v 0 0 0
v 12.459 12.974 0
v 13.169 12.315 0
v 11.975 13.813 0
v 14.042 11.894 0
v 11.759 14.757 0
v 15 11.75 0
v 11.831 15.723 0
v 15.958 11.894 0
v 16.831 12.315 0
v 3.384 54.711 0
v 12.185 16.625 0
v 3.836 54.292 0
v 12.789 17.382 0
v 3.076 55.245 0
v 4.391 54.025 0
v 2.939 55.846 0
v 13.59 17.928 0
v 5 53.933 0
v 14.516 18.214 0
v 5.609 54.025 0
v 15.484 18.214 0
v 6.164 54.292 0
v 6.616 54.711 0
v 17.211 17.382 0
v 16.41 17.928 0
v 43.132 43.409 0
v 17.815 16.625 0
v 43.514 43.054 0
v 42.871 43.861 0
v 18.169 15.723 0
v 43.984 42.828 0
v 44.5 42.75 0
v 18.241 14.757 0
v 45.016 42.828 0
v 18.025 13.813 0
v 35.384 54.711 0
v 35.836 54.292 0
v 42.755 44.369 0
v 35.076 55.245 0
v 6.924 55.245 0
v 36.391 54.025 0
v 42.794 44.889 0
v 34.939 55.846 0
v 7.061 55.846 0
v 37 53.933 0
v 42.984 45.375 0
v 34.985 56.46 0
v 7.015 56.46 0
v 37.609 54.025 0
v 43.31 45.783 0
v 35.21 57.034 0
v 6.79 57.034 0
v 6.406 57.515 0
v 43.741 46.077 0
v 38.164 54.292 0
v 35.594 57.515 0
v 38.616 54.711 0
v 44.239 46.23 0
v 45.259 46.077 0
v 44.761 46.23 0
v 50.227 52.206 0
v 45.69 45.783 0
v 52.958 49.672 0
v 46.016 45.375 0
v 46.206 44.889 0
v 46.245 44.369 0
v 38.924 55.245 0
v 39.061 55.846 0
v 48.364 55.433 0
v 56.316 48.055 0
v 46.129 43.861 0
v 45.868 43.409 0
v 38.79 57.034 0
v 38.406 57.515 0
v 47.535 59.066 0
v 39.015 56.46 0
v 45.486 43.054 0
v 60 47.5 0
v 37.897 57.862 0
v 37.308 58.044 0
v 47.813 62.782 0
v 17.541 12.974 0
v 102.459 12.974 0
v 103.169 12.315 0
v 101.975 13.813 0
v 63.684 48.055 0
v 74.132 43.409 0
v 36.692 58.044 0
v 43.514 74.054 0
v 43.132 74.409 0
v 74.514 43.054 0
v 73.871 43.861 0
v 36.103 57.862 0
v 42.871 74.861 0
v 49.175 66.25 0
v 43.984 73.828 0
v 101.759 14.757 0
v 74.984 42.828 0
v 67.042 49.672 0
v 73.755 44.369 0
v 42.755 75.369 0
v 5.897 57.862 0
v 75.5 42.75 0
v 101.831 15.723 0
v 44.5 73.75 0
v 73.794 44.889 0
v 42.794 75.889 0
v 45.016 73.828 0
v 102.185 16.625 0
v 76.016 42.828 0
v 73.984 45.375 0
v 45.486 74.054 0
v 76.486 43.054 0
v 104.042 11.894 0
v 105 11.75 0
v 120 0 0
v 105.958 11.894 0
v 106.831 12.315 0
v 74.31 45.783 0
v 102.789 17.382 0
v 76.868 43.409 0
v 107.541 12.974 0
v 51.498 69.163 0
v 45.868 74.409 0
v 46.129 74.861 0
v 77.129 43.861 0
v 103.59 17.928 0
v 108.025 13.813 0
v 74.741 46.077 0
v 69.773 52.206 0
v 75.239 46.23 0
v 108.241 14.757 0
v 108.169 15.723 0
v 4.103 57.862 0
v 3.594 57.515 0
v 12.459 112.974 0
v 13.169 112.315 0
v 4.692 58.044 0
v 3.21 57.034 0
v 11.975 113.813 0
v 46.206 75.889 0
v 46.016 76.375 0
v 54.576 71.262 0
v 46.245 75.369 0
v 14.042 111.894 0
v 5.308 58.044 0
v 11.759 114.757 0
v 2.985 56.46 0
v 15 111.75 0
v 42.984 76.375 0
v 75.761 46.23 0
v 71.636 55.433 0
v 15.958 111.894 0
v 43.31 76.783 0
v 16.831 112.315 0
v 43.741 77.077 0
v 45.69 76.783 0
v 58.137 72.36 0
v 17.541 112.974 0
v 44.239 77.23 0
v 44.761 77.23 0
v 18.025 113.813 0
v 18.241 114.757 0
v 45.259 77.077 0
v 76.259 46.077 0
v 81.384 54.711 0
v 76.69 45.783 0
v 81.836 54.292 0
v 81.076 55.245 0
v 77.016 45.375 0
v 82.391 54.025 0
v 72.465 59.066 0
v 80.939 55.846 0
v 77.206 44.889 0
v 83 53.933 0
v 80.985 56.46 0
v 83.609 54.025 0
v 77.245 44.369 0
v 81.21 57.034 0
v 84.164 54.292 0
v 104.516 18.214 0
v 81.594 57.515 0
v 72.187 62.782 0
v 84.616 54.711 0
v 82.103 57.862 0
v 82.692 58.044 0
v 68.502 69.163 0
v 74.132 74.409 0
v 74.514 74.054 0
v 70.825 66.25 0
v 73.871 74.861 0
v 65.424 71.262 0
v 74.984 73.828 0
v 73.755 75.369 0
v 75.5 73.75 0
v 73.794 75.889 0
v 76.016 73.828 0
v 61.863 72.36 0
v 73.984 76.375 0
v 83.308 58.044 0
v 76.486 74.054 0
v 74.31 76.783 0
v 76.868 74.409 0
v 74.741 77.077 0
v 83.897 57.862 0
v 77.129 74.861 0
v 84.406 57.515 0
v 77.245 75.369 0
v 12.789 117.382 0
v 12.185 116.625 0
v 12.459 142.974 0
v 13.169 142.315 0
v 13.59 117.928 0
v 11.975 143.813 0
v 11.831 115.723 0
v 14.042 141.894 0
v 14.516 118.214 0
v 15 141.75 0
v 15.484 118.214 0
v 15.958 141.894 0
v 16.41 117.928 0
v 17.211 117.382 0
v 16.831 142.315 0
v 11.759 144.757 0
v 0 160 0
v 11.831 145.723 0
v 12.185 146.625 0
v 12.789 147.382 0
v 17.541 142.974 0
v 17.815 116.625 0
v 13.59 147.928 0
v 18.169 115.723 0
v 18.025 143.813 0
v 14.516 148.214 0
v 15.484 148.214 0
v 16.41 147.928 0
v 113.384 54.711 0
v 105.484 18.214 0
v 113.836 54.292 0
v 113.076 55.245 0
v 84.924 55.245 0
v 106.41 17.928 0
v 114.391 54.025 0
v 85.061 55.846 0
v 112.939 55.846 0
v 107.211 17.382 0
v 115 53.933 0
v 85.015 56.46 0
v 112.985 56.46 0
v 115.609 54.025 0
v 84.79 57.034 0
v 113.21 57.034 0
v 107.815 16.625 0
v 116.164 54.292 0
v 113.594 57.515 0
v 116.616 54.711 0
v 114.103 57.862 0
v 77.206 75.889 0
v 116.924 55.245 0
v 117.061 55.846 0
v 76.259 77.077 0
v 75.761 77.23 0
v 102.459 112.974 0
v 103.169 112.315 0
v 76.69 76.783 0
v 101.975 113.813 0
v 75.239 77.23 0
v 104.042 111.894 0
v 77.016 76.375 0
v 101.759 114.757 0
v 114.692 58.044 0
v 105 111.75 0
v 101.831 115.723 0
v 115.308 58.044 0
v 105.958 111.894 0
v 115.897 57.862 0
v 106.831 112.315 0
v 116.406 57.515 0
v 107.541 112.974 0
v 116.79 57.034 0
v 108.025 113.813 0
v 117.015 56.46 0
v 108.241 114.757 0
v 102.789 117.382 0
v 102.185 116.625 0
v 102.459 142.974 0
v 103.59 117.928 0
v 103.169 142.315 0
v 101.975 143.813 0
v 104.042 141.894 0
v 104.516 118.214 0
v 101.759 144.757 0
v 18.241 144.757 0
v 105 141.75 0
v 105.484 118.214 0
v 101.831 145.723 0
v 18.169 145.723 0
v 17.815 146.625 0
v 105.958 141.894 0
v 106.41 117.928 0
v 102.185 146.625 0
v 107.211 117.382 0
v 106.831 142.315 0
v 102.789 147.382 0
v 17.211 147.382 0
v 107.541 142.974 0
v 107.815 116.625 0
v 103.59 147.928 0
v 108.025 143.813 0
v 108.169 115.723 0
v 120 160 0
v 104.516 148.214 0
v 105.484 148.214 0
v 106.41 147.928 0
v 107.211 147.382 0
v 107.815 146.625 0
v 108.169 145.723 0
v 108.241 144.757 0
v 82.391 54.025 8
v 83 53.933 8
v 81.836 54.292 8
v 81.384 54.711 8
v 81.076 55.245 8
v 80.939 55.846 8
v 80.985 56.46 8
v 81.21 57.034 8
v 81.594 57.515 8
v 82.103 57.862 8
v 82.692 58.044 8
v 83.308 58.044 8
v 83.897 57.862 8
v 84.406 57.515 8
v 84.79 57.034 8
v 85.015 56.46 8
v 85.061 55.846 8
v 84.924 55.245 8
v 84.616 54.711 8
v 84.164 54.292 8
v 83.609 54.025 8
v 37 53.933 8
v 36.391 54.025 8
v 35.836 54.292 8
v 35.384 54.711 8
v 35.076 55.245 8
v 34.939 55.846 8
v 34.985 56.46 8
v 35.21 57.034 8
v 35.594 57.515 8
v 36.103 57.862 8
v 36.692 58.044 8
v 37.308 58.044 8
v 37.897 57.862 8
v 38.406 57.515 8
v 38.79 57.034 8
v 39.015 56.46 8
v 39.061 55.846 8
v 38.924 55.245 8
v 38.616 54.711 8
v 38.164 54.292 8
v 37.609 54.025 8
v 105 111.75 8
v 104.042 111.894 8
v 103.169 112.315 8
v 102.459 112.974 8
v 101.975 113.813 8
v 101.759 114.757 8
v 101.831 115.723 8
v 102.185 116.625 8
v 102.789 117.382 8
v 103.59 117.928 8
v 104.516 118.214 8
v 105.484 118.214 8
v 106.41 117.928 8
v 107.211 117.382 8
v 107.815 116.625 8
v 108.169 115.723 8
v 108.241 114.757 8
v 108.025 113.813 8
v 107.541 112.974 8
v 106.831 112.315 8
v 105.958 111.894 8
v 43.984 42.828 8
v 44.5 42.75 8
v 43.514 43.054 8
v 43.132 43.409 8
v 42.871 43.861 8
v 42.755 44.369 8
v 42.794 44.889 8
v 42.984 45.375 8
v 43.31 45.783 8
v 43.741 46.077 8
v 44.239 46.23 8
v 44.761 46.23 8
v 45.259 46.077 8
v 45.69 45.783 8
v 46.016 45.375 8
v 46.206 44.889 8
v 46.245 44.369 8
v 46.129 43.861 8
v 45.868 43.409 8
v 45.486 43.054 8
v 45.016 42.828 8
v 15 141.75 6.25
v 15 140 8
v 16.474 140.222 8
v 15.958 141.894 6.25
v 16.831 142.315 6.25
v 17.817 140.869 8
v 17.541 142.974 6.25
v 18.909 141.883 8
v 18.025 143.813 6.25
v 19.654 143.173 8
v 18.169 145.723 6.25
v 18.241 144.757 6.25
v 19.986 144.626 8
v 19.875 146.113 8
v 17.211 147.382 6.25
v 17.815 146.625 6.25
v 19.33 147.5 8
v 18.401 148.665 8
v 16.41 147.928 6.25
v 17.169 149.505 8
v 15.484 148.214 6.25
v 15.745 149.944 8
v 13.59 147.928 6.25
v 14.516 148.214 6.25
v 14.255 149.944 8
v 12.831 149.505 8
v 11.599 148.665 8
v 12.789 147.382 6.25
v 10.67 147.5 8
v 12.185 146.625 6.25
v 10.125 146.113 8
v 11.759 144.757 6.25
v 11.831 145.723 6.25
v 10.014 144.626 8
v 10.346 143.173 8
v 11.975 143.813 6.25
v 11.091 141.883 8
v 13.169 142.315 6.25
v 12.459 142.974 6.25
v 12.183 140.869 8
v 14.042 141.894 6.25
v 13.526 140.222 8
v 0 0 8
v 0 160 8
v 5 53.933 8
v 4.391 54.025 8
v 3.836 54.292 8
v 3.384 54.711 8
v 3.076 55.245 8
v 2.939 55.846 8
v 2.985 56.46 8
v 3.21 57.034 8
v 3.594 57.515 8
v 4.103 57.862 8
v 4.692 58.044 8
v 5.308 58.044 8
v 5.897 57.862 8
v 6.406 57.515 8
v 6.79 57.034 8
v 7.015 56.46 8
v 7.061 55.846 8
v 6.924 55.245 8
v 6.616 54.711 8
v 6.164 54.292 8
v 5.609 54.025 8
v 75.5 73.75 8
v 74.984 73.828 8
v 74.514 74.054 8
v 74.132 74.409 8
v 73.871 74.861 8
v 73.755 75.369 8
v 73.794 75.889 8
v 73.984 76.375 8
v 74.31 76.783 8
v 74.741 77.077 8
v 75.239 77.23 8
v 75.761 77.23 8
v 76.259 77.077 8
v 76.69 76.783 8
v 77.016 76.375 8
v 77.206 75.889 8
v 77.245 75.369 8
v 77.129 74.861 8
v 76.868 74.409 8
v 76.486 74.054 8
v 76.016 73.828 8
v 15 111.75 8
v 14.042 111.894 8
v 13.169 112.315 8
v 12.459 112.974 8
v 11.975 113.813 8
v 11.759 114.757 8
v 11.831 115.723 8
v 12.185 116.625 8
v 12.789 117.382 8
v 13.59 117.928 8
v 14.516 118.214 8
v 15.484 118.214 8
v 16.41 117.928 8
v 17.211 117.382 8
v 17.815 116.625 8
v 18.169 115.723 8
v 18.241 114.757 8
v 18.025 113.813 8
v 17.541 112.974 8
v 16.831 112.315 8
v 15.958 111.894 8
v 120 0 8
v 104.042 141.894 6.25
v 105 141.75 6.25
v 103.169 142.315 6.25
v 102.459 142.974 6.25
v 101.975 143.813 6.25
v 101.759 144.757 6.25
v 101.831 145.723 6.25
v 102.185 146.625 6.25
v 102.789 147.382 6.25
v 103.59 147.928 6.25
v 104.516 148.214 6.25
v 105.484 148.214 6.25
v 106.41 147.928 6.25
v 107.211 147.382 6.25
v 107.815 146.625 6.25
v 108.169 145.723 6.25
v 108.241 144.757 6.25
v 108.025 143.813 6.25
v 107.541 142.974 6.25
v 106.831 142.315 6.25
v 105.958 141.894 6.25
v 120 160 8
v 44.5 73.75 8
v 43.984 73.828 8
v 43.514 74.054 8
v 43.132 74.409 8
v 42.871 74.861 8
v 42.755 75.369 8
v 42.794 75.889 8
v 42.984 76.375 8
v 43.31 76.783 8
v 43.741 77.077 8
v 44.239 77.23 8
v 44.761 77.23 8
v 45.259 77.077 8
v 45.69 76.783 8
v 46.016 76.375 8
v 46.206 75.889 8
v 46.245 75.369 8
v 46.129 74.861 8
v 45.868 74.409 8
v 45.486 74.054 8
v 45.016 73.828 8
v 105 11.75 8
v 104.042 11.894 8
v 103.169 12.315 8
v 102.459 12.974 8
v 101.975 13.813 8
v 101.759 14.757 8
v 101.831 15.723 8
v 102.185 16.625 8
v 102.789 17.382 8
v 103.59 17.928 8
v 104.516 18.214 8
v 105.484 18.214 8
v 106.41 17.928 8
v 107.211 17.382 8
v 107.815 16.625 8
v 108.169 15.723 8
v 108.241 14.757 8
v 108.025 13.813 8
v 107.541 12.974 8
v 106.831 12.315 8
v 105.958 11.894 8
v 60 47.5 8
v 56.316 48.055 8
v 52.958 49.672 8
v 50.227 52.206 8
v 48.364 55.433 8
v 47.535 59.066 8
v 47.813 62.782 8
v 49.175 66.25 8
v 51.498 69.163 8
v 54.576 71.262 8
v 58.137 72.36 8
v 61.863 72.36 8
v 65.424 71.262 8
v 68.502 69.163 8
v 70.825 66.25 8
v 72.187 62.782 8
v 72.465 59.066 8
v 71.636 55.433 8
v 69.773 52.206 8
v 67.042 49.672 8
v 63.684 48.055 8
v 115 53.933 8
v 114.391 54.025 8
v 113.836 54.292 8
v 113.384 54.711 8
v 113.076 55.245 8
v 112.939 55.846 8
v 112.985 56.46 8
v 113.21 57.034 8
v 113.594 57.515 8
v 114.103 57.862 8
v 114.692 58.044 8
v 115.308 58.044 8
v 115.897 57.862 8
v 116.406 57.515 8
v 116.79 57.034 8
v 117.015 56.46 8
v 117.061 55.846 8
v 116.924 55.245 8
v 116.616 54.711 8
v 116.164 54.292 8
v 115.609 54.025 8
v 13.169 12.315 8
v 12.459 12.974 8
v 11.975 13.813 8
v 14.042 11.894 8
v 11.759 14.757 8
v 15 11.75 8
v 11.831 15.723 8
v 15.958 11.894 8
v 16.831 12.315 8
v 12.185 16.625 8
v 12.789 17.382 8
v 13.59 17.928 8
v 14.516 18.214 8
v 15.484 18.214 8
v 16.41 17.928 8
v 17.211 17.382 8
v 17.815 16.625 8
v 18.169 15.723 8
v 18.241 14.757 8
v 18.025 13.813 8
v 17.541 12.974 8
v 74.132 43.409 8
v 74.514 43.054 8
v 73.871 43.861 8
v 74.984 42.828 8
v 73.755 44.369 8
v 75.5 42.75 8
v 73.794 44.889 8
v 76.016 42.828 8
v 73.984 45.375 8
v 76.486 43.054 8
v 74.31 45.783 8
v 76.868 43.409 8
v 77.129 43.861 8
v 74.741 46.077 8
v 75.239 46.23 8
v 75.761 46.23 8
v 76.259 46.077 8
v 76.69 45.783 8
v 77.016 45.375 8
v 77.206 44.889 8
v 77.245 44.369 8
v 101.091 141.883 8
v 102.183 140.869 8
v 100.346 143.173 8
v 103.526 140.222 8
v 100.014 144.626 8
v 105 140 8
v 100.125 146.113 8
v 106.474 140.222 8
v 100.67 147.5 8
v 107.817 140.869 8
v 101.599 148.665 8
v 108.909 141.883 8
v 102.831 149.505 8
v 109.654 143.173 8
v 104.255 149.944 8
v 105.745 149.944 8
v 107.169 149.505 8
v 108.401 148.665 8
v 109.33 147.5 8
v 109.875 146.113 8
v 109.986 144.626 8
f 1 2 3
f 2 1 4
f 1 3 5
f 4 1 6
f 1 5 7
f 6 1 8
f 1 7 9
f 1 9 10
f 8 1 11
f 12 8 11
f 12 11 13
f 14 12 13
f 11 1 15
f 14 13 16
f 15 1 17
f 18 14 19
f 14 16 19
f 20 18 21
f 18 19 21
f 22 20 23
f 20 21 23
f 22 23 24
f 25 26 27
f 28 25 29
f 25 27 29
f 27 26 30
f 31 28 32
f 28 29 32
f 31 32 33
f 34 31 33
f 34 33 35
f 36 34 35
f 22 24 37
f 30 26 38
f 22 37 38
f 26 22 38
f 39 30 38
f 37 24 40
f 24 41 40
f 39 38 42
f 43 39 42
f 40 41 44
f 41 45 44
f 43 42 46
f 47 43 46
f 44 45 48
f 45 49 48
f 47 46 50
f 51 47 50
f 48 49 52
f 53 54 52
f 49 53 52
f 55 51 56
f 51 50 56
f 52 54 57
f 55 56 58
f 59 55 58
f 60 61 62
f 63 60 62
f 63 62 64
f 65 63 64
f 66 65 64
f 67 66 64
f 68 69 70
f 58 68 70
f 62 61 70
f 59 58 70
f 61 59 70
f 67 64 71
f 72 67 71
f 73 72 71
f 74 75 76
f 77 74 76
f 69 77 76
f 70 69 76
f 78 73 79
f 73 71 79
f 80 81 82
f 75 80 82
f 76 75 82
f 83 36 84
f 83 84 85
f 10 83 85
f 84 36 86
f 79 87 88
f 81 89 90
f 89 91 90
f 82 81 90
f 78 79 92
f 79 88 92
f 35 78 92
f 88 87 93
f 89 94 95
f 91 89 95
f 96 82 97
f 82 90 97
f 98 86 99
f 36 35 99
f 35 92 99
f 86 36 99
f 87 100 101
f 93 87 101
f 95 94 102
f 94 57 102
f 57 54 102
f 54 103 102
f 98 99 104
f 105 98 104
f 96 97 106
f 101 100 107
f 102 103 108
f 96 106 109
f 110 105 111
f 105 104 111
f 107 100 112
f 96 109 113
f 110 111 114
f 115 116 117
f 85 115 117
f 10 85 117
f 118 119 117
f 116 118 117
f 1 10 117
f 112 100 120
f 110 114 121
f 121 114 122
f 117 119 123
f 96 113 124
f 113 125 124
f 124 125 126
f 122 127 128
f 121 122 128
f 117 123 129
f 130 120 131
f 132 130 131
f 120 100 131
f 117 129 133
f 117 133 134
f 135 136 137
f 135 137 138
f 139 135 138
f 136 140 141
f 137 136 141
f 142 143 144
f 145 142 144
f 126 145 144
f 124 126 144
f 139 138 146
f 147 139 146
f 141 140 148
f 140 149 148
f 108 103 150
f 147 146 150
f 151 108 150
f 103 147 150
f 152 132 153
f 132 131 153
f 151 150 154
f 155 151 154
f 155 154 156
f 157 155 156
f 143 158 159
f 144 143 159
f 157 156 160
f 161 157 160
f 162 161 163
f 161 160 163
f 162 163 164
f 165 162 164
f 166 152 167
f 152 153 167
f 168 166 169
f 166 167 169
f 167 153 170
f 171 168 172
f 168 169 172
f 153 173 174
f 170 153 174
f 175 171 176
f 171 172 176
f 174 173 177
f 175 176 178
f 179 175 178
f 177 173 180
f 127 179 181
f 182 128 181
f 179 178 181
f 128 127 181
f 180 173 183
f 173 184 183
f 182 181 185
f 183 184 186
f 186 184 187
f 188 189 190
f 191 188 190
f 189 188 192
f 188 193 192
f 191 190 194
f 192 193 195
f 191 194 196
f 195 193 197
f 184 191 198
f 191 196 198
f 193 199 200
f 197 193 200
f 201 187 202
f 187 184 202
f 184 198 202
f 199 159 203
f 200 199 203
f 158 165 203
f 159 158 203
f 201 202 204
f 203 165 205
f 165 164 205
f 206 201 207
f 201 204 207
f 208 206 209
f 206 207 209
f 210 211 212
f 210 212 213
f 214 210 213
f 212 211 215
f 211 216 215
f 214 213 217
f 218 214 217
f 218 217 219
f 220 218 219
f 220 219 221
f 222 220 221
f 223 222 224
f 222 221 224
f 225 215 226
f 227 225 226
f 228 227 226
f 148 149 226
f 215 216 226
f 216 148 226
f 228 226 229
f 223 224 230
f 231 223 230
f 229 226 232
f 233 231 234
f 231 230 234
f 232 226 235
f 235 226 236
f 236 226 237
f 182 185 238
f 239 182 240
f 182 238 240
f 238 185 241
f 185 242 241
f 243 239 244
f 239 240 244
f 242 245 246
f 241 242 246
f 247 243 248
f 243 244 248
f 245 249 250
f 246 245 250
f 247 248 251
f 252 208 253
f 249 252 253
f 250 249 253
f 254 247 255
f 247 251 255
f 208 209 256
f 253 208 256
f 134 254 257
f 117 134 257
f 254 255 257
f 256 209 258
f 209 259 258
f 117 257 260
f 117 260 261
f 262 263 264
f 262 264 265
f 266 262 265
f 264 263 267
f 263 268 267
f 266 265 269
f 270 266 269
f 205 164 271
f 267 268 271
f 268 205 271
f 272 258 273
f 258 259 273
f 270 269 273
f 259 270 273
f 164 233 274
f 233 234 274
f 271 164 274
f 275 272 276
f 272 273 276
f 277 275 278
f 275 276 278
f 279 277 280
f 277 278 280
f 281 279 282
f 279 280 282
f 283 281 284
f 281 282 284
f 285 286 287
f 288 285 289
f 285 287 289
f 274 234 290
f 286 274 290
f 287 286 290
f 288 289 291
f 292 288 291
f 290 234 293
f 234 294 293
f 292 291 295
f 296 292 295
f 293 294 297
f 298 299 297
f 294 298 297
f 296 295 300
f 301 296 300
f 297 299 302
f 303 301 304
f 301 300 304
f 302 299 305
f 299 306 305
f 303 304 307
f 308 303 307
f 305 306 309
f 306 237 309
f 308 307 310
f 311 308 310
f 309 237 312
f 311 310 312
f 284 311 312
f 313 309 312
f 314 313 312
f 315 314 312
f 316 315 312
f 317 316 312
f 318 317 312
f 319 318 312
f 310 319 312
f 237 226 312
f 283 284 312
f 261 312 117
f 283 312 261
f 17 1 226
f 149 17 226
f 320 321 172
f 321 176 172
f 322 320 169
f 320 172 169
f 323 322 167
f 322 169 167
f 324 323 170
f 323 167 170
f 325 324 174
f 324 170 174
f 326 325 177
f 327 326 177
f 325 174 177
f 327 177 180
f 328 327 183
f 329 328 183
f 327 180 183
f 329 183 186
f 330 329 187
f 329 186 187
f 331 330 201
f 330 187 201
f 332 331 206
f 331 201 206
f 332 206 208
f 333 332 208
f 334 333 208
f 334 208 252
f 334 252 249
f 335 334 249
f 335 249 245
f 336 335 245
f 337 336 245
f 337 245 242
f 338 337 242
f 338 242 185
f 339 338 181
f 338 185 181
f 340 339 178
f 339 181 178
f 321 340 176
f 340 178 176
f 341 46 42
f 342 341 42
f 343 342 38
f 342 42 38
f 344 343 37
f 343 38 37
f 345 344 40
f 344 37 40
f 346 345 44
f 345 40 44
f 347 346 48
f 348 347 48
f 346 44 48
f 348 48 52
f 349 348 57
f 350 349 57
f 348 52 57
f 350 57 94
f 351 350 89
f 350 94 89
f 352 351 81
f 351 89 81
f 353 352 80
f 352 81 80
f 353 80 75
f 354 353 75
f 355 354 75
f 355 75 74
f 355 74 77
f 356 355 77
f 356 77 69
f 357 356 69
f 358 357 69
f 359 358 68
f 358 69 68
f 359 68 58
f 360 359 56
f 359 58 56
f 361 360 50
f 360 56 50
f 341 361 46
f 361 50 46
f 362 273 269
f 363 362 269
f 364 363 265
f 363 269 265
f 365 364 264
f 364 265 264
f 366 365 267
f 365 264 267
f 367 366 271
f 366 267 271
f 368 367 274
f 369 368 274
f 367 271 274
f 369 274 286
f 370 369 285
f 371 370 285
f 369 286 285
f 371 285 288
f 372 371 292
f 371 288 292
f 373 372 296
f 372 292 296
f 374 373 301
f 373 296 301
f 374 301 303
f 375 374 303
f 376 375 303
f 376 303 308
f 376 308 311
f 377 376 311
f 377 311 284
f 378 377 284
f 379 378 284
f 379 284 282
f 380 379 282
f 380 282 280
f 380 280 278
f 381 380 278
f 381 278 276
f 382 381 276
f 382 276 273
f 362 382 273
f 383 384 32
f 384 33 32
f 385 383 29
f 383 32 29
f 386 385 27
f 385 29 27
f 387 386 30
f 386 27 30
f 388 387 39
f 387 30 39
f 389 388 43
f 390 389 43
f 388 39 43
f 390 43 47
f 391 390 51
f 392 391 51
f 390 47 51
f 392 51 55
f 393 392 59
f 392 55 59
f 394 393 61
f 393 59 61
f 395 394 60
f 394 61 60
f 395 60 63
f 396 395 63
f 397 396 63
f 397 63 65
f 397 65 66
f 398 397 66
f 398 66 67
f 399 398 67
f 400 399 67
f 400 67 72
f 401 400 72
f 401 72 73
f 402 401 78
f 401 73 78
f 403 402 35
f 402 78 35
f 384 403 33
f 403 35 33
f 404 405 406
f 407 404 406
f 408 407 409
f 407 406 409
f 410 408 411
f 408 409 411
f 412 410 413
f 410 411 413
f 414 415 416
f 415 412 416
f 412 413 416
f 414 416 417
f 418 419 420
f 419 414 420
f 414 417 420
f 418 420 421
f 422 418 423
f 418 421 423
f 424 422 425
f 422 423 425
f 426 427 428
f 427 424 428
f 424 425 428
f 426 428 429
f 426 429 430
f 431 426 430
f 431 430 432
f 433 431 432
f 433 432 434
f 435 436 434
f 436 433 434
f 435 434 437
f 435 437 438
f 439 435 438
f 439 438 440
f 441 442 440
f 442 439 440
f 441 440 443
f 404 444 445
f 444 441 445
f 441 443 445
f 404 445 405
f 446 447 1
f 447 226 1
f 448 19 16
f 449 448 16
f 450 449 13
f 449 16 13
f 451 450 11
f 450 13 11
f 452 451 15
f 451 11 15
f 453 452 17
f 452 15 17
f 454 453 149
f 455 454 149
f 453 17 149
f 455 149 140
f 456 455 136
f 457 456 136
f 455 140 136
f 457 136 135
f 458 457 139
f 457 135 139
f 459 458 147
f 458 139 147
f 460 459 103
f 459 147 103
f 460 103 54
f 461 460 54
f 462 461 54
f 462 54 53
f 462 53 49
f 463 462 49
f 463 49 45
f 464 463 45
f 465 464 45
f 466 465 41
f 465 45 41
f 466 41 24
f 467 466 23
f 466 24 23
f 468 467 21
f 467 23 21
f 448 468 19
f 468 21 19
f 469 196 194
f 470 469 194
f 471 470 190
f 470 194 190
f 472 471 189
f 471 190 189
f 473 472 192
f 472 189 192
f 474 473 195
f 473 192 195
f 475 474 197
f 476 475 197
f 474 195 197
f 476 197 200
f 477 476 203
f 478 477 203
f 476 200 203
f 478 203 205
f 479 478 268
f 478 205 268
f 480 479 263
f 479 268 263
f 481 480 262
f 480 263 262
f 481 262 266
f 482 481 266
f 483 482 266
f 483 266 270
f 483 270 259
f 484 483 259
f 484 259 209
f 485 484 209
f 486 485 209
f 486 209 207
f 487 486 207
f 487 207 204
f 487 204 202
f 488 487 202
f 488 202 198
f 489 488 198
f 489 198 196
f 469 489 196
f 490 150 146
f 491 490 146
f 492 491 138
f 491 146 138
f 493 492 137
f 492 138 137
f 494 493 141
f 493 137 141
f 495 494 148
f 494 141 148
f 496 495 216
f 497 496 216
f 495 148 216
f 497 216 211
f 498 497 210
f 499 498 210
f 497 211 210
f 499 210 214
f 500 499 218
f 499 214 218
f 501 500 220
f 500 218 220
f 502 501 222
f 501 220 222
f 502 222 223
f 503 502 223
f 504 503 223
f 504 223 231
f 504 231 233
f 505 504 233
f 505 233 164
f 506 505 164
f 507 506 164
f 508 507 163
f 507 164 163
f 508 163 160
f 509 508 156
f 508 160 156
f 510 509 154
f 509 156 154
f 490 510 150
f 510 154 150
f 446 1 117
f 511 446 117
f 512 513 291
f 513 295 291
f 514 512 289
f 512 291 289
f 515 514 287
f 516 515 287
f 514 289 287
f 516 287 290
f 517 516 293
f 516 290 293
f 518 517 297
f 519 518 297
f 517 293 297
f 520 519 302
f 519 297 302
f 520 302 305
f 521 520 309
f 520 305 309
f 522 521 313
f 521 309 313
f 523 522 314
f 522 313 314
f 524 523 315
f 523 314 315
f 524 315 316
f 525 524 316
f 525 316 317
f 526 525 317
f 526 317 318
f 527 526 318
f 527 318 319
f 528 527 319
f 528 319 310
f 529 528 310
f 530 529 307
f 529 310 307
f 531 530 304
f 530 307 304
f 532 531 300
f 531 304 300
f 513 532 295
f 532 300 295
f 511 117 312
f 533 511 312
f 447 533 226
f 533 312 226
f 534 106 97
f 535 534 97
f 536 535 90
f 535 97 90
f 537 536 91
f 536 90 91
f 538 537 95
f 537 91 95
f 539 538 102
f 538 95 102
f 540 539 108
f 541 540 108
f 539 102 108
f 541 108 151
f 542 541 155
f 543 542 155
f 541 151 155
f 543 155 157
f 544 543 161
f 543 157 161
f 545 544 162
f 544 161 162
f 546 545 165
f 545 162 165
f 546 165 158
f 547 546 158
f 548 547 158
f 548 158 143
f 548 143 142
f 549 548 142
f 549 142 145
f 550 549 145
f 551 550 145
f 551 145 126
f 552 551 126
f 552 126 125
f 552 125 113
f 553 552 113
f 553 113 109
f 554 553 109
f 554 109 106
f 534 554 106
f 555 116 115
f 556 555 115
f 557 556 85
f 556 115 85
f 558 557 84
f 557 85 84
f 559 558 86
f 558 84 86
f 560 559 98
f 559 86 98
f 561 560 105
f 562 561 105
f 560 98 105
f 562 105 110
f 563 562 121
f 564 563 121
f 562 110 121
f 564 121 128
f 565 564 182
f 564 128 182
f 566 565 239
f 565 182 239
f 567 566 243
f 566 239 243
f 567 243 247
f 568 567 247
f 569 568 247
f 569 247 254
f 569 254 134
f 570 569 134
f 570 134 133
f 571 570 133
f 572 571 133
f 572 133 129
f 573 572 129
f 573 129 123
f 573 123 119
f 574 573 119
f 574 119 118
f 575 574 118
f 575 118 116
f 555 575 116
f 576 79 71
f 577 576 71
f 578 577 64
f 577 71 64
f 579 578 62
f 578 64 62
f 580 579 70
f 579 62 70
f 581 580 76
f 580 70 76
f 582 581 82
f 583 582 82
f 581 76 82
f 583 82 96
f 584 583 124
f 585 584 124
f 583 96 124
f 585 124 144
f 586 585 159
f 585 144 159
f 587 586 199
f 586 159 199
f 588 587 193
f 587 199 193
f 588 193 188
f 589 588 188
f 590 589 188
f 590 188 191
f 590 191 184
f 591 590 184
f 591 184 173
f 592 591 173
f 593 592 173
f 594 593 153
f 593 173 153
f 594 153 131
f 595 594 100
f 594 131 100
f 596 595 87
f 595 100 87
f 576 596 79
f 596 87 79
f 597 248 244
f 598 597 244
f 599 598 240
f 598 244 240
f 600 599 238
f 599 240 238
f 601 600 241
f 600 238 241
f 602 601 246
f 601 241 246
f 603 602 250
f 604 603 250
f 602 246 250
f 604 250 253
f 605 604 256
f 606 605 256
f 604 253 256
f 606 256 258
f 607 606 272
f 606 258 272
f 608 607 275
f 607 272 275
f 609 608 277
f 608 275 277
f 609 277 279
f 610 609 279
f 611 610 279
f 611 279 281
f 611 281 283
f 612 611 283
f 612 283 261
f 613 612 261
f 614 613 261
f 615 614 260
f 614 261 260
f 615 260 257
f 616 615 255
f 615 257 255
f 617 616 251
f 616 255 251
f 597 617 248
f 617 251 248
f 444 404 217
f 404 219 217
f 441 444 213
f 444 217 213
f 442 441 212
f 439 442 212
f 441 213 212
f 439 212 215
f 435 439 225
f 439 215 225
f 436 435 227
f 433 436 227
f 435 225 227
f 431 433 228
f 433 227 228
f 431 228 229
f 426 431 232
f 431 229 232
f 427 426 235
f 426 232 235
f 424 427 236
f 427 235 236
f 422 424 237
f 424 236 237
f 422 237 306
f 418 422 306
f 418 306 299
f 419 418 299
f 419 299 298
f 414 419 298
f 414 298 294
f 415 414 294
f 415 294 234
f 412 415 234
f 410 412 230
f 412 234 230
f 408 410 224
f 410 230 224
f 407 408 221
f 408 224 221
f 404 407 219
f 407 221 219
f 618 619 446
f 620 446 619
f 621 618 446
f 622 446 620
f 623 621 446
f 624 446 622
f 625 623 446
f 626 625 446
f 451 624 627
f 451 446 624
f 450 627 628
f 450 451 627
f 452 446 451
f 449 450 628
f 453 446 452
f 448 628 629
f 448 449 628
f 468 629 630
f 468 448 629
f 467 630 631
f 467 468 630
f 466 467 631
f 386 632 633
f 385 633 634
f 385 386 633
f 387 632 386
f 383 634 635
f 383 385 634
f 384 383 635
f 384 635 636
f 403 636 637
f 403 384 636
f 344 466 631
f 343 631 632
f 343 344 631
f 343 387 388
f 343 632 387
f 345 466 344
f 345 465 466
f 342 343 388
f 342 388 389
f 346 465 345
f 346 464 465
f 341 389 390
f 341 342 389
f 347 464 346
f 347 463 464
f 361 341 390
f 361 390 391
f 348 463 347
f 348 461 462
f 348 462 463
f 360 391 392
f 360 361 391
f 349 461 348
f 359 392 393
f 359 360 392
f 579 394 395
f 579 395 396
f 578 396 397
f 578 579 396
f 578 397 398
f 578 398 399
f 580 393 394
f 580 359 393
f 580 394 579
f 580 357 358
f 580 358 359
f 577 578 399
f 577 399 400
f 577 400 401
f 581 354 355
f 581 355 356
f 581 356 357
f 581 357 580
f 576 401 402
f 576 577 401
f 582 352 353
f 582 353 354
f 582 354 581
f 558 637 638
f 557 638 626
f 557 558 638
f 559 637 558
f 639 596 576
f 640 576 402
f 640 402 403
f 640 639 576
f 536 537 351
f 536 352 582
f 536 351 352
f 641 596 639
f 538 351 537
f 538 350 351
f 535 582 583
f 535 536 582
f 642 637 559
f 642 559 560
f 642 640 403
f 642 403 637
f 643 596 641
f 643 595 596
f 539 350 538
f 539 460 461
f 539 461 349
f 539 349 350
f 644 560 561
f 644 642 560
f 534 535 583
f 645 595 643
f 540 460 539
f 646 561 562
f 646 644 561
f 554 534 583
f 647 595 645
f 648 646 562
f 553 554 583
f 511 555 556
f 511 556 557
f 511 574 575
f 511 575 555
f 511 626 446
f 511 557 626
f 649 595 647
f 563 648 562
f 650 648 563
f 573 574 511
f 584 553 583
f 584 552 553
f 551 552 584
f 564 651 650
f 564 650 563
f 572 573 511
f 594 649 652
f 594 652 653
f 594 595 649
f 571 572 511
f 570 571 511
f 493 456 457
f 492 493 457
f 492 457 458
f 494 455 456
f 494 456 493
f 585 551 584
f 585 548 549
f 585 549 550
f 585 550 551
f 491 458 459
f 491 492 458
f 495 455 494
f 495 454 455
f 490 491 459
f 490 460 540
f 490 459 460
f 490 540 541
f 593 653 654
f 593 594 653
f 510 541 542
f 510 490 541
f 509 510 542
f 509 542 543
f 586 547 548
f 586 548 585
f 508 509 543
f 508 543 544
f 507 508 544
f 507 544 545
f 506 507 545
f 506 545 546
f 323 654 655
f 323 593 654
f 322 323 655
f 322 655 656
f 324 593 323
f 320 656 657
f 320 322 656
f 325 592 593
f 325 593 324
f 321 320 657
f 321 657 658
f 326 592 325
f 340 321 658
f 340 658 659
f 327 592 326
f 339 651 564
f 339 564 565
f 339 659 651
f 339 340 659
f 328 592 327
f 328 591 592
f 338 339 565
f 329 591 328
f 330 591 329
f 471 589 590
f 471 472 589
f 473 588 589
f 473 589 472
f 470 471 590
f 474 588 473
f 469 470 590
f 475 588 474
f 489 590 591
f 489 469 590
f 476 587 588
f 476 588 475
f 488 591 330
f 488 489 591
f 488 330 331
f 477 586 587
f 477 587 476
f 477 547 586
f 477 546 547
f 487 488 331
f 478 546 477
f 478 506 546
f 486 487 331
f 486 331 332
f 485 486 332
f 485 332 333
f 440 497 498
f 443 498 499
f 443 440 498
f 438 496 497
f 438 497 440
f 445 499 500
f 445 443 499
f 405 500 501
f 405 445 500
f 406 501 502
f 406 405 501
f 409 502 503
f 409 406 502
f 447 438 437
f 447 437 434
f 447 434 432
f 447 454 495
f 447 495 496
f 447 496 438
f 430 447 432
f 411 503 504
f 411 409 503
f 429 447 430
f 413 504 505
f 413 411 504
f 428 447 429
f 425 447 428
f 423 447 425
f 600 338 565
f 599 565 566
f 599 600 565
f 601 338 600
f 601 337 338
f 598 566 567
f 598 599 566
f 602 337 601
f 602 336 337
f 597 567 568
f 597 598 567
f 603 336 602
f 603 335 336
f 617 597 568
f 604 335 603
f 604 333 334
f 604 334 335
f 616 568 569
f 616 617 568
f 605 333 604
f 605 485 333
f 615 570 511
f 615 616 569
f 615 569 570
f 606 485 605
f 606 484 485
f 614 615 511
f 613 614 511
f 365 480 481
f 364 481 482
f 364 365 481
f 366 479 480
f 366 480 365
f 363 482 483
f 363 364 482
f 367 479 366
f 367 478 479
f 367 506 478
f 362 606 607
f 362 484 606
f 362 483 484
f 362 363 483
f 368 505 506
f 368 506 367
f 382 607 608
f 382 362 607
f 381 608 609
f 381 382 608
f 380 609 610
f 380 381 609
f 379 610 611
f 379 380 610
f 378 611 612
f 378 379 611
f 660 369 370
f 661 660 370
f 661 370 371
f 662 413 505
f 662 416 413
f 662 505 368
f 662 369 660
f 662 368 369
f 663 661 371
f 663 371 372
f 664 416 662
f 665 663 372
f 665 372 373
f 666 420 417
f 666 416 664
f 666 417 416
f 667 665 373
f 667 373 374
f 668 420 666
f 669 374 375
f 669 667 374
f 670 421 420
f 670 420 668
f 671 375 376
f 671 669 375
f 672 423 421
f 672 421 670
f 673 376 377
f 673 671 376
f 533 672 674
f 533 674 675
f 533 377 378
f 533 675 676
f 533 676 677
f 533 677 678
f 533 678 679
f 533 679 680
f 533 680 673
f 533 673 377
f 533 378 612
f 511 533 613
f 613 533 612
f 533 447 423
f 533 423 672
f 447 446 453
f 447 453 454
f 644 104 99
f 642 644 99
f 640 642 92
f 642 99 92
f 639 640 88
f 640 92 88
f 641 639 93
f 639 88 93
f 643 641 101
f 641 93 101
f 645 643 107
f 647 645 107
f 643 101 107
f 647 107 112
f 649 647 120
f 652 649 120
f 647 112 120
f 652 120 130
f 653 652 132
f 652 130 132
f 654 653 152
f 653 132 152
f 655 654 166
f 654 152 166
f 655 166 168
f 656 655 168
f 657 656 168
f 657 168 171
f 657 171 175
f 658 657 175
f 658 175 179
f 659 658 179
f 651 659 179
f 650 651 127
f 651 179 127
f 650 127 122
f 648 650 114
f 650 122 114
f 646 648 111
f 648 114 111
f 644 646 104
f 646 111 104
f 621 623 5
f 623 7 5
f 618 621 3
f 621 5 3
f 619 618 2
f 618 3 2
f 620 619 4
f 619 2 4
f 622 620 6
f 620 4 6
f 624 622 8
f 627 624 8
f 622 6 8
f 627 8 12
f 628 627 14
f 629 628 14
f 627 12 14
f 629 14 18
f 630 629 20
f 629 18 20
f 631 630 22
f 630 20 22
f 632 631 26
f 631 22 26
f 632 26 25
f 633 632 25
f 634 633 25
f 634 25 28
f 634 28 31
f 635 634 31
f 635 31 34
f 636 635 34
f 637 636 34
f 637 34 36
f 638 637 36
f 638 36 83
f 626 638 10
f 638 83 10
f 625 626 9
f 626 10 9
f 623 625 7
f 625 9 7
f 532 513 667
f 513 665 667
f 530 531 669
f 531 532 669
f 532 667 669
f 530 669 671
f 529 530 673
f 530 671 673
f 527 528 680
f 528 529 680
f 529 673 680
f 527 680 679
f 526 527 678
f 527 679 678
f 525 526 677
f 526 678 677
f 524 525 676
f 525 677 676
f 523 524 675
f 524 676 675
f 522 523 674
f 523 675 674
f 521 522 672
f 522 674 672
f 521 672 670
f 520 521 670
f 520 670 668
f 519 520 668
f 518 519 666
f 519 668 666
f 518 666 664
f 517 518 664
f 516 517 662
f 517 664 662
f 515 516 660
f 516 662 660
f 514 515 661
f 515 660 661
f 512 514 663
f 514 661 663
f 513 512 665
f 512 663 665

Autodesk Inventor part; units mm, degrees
ref_plane "YZ Plane" through (0, 0, 0) normal (1, 0, 0) x (0, 1, 0)
ref_plane "XZ Plane" through (0, 0, 0) normal (0, 1, 0) x (-1, 0, 0)
ref_plane "XY Plane" through (0, 0, 0) normal (0, 0, 1) x (1, 0, 0)
sketch "Sketch1" plane through (0, 0, 0) normal (0, 0, 1) x (1, 0, 0)
  line L0 (0, 0) -> (120, 0)
  line L1 (120, 0) -> (120, 160)
  line L2 (120, 160) -> (0, 160)
  line L3 (0, 160) -> (0, 0)
  dimension "width" = 120
  dimension "d1" = 160
extrude "Extrusion1" add sketch "Sketch1" along normal blind 8
hole "Hole1" at (15, 15, 8) direction (0, 0, -1) diameter 6.5 end through all
pattern_linear "Rectangular Pattern1" count 2 spacing 90 along (1, 0, 0) count 2 spacing 100 along (0, 1, 0) of "Hole1"
hole "Hole2" at (15, 145, 8) direction (0, 0, -1) diameter 6.5 end through all countersink diameter 10 countersink angle 90
pattern_linear "Rectangular Pattern2" count 2 spacing 90 along (1, 0, 0) of "Hole2"
hole "Hole3" at (60, 60, 8) direction (0, 0, -1) diameter 25 end through all
hole "Hole4" at (44.5, 75.5, 8) direction (0, 0, -1) diameter 3.5 end through all
pattern_linear "Rectangular Pattern3" count 2 spacing 31 along (0, -1, 0) count 2 spacing 31 along (1, 0, 0) of "Hole4"
hole "Hole5" at (5, 56, 8) direction (0, 0, -1) diameter 4.134 end through all thread size "M5x0.8" class "6H" standard "ANSI Metric M Profile"
hole "Hole6" at (115, 56, 8) direction (0, 0, -1) diameter 4.134 end through all thread size "M5x0.8" class "6H" standard "ANSI Metric M Profile"
pattern_linear "Rectangular Pattern4" count 2 spacing 32 along (1, 0, 0) of "Hole5"
pattern_linear "Rectangular Pattern5" count 2 spacing 32 along (-1, 0, 0) of "Hole6"
properties part number "motor plate support"
